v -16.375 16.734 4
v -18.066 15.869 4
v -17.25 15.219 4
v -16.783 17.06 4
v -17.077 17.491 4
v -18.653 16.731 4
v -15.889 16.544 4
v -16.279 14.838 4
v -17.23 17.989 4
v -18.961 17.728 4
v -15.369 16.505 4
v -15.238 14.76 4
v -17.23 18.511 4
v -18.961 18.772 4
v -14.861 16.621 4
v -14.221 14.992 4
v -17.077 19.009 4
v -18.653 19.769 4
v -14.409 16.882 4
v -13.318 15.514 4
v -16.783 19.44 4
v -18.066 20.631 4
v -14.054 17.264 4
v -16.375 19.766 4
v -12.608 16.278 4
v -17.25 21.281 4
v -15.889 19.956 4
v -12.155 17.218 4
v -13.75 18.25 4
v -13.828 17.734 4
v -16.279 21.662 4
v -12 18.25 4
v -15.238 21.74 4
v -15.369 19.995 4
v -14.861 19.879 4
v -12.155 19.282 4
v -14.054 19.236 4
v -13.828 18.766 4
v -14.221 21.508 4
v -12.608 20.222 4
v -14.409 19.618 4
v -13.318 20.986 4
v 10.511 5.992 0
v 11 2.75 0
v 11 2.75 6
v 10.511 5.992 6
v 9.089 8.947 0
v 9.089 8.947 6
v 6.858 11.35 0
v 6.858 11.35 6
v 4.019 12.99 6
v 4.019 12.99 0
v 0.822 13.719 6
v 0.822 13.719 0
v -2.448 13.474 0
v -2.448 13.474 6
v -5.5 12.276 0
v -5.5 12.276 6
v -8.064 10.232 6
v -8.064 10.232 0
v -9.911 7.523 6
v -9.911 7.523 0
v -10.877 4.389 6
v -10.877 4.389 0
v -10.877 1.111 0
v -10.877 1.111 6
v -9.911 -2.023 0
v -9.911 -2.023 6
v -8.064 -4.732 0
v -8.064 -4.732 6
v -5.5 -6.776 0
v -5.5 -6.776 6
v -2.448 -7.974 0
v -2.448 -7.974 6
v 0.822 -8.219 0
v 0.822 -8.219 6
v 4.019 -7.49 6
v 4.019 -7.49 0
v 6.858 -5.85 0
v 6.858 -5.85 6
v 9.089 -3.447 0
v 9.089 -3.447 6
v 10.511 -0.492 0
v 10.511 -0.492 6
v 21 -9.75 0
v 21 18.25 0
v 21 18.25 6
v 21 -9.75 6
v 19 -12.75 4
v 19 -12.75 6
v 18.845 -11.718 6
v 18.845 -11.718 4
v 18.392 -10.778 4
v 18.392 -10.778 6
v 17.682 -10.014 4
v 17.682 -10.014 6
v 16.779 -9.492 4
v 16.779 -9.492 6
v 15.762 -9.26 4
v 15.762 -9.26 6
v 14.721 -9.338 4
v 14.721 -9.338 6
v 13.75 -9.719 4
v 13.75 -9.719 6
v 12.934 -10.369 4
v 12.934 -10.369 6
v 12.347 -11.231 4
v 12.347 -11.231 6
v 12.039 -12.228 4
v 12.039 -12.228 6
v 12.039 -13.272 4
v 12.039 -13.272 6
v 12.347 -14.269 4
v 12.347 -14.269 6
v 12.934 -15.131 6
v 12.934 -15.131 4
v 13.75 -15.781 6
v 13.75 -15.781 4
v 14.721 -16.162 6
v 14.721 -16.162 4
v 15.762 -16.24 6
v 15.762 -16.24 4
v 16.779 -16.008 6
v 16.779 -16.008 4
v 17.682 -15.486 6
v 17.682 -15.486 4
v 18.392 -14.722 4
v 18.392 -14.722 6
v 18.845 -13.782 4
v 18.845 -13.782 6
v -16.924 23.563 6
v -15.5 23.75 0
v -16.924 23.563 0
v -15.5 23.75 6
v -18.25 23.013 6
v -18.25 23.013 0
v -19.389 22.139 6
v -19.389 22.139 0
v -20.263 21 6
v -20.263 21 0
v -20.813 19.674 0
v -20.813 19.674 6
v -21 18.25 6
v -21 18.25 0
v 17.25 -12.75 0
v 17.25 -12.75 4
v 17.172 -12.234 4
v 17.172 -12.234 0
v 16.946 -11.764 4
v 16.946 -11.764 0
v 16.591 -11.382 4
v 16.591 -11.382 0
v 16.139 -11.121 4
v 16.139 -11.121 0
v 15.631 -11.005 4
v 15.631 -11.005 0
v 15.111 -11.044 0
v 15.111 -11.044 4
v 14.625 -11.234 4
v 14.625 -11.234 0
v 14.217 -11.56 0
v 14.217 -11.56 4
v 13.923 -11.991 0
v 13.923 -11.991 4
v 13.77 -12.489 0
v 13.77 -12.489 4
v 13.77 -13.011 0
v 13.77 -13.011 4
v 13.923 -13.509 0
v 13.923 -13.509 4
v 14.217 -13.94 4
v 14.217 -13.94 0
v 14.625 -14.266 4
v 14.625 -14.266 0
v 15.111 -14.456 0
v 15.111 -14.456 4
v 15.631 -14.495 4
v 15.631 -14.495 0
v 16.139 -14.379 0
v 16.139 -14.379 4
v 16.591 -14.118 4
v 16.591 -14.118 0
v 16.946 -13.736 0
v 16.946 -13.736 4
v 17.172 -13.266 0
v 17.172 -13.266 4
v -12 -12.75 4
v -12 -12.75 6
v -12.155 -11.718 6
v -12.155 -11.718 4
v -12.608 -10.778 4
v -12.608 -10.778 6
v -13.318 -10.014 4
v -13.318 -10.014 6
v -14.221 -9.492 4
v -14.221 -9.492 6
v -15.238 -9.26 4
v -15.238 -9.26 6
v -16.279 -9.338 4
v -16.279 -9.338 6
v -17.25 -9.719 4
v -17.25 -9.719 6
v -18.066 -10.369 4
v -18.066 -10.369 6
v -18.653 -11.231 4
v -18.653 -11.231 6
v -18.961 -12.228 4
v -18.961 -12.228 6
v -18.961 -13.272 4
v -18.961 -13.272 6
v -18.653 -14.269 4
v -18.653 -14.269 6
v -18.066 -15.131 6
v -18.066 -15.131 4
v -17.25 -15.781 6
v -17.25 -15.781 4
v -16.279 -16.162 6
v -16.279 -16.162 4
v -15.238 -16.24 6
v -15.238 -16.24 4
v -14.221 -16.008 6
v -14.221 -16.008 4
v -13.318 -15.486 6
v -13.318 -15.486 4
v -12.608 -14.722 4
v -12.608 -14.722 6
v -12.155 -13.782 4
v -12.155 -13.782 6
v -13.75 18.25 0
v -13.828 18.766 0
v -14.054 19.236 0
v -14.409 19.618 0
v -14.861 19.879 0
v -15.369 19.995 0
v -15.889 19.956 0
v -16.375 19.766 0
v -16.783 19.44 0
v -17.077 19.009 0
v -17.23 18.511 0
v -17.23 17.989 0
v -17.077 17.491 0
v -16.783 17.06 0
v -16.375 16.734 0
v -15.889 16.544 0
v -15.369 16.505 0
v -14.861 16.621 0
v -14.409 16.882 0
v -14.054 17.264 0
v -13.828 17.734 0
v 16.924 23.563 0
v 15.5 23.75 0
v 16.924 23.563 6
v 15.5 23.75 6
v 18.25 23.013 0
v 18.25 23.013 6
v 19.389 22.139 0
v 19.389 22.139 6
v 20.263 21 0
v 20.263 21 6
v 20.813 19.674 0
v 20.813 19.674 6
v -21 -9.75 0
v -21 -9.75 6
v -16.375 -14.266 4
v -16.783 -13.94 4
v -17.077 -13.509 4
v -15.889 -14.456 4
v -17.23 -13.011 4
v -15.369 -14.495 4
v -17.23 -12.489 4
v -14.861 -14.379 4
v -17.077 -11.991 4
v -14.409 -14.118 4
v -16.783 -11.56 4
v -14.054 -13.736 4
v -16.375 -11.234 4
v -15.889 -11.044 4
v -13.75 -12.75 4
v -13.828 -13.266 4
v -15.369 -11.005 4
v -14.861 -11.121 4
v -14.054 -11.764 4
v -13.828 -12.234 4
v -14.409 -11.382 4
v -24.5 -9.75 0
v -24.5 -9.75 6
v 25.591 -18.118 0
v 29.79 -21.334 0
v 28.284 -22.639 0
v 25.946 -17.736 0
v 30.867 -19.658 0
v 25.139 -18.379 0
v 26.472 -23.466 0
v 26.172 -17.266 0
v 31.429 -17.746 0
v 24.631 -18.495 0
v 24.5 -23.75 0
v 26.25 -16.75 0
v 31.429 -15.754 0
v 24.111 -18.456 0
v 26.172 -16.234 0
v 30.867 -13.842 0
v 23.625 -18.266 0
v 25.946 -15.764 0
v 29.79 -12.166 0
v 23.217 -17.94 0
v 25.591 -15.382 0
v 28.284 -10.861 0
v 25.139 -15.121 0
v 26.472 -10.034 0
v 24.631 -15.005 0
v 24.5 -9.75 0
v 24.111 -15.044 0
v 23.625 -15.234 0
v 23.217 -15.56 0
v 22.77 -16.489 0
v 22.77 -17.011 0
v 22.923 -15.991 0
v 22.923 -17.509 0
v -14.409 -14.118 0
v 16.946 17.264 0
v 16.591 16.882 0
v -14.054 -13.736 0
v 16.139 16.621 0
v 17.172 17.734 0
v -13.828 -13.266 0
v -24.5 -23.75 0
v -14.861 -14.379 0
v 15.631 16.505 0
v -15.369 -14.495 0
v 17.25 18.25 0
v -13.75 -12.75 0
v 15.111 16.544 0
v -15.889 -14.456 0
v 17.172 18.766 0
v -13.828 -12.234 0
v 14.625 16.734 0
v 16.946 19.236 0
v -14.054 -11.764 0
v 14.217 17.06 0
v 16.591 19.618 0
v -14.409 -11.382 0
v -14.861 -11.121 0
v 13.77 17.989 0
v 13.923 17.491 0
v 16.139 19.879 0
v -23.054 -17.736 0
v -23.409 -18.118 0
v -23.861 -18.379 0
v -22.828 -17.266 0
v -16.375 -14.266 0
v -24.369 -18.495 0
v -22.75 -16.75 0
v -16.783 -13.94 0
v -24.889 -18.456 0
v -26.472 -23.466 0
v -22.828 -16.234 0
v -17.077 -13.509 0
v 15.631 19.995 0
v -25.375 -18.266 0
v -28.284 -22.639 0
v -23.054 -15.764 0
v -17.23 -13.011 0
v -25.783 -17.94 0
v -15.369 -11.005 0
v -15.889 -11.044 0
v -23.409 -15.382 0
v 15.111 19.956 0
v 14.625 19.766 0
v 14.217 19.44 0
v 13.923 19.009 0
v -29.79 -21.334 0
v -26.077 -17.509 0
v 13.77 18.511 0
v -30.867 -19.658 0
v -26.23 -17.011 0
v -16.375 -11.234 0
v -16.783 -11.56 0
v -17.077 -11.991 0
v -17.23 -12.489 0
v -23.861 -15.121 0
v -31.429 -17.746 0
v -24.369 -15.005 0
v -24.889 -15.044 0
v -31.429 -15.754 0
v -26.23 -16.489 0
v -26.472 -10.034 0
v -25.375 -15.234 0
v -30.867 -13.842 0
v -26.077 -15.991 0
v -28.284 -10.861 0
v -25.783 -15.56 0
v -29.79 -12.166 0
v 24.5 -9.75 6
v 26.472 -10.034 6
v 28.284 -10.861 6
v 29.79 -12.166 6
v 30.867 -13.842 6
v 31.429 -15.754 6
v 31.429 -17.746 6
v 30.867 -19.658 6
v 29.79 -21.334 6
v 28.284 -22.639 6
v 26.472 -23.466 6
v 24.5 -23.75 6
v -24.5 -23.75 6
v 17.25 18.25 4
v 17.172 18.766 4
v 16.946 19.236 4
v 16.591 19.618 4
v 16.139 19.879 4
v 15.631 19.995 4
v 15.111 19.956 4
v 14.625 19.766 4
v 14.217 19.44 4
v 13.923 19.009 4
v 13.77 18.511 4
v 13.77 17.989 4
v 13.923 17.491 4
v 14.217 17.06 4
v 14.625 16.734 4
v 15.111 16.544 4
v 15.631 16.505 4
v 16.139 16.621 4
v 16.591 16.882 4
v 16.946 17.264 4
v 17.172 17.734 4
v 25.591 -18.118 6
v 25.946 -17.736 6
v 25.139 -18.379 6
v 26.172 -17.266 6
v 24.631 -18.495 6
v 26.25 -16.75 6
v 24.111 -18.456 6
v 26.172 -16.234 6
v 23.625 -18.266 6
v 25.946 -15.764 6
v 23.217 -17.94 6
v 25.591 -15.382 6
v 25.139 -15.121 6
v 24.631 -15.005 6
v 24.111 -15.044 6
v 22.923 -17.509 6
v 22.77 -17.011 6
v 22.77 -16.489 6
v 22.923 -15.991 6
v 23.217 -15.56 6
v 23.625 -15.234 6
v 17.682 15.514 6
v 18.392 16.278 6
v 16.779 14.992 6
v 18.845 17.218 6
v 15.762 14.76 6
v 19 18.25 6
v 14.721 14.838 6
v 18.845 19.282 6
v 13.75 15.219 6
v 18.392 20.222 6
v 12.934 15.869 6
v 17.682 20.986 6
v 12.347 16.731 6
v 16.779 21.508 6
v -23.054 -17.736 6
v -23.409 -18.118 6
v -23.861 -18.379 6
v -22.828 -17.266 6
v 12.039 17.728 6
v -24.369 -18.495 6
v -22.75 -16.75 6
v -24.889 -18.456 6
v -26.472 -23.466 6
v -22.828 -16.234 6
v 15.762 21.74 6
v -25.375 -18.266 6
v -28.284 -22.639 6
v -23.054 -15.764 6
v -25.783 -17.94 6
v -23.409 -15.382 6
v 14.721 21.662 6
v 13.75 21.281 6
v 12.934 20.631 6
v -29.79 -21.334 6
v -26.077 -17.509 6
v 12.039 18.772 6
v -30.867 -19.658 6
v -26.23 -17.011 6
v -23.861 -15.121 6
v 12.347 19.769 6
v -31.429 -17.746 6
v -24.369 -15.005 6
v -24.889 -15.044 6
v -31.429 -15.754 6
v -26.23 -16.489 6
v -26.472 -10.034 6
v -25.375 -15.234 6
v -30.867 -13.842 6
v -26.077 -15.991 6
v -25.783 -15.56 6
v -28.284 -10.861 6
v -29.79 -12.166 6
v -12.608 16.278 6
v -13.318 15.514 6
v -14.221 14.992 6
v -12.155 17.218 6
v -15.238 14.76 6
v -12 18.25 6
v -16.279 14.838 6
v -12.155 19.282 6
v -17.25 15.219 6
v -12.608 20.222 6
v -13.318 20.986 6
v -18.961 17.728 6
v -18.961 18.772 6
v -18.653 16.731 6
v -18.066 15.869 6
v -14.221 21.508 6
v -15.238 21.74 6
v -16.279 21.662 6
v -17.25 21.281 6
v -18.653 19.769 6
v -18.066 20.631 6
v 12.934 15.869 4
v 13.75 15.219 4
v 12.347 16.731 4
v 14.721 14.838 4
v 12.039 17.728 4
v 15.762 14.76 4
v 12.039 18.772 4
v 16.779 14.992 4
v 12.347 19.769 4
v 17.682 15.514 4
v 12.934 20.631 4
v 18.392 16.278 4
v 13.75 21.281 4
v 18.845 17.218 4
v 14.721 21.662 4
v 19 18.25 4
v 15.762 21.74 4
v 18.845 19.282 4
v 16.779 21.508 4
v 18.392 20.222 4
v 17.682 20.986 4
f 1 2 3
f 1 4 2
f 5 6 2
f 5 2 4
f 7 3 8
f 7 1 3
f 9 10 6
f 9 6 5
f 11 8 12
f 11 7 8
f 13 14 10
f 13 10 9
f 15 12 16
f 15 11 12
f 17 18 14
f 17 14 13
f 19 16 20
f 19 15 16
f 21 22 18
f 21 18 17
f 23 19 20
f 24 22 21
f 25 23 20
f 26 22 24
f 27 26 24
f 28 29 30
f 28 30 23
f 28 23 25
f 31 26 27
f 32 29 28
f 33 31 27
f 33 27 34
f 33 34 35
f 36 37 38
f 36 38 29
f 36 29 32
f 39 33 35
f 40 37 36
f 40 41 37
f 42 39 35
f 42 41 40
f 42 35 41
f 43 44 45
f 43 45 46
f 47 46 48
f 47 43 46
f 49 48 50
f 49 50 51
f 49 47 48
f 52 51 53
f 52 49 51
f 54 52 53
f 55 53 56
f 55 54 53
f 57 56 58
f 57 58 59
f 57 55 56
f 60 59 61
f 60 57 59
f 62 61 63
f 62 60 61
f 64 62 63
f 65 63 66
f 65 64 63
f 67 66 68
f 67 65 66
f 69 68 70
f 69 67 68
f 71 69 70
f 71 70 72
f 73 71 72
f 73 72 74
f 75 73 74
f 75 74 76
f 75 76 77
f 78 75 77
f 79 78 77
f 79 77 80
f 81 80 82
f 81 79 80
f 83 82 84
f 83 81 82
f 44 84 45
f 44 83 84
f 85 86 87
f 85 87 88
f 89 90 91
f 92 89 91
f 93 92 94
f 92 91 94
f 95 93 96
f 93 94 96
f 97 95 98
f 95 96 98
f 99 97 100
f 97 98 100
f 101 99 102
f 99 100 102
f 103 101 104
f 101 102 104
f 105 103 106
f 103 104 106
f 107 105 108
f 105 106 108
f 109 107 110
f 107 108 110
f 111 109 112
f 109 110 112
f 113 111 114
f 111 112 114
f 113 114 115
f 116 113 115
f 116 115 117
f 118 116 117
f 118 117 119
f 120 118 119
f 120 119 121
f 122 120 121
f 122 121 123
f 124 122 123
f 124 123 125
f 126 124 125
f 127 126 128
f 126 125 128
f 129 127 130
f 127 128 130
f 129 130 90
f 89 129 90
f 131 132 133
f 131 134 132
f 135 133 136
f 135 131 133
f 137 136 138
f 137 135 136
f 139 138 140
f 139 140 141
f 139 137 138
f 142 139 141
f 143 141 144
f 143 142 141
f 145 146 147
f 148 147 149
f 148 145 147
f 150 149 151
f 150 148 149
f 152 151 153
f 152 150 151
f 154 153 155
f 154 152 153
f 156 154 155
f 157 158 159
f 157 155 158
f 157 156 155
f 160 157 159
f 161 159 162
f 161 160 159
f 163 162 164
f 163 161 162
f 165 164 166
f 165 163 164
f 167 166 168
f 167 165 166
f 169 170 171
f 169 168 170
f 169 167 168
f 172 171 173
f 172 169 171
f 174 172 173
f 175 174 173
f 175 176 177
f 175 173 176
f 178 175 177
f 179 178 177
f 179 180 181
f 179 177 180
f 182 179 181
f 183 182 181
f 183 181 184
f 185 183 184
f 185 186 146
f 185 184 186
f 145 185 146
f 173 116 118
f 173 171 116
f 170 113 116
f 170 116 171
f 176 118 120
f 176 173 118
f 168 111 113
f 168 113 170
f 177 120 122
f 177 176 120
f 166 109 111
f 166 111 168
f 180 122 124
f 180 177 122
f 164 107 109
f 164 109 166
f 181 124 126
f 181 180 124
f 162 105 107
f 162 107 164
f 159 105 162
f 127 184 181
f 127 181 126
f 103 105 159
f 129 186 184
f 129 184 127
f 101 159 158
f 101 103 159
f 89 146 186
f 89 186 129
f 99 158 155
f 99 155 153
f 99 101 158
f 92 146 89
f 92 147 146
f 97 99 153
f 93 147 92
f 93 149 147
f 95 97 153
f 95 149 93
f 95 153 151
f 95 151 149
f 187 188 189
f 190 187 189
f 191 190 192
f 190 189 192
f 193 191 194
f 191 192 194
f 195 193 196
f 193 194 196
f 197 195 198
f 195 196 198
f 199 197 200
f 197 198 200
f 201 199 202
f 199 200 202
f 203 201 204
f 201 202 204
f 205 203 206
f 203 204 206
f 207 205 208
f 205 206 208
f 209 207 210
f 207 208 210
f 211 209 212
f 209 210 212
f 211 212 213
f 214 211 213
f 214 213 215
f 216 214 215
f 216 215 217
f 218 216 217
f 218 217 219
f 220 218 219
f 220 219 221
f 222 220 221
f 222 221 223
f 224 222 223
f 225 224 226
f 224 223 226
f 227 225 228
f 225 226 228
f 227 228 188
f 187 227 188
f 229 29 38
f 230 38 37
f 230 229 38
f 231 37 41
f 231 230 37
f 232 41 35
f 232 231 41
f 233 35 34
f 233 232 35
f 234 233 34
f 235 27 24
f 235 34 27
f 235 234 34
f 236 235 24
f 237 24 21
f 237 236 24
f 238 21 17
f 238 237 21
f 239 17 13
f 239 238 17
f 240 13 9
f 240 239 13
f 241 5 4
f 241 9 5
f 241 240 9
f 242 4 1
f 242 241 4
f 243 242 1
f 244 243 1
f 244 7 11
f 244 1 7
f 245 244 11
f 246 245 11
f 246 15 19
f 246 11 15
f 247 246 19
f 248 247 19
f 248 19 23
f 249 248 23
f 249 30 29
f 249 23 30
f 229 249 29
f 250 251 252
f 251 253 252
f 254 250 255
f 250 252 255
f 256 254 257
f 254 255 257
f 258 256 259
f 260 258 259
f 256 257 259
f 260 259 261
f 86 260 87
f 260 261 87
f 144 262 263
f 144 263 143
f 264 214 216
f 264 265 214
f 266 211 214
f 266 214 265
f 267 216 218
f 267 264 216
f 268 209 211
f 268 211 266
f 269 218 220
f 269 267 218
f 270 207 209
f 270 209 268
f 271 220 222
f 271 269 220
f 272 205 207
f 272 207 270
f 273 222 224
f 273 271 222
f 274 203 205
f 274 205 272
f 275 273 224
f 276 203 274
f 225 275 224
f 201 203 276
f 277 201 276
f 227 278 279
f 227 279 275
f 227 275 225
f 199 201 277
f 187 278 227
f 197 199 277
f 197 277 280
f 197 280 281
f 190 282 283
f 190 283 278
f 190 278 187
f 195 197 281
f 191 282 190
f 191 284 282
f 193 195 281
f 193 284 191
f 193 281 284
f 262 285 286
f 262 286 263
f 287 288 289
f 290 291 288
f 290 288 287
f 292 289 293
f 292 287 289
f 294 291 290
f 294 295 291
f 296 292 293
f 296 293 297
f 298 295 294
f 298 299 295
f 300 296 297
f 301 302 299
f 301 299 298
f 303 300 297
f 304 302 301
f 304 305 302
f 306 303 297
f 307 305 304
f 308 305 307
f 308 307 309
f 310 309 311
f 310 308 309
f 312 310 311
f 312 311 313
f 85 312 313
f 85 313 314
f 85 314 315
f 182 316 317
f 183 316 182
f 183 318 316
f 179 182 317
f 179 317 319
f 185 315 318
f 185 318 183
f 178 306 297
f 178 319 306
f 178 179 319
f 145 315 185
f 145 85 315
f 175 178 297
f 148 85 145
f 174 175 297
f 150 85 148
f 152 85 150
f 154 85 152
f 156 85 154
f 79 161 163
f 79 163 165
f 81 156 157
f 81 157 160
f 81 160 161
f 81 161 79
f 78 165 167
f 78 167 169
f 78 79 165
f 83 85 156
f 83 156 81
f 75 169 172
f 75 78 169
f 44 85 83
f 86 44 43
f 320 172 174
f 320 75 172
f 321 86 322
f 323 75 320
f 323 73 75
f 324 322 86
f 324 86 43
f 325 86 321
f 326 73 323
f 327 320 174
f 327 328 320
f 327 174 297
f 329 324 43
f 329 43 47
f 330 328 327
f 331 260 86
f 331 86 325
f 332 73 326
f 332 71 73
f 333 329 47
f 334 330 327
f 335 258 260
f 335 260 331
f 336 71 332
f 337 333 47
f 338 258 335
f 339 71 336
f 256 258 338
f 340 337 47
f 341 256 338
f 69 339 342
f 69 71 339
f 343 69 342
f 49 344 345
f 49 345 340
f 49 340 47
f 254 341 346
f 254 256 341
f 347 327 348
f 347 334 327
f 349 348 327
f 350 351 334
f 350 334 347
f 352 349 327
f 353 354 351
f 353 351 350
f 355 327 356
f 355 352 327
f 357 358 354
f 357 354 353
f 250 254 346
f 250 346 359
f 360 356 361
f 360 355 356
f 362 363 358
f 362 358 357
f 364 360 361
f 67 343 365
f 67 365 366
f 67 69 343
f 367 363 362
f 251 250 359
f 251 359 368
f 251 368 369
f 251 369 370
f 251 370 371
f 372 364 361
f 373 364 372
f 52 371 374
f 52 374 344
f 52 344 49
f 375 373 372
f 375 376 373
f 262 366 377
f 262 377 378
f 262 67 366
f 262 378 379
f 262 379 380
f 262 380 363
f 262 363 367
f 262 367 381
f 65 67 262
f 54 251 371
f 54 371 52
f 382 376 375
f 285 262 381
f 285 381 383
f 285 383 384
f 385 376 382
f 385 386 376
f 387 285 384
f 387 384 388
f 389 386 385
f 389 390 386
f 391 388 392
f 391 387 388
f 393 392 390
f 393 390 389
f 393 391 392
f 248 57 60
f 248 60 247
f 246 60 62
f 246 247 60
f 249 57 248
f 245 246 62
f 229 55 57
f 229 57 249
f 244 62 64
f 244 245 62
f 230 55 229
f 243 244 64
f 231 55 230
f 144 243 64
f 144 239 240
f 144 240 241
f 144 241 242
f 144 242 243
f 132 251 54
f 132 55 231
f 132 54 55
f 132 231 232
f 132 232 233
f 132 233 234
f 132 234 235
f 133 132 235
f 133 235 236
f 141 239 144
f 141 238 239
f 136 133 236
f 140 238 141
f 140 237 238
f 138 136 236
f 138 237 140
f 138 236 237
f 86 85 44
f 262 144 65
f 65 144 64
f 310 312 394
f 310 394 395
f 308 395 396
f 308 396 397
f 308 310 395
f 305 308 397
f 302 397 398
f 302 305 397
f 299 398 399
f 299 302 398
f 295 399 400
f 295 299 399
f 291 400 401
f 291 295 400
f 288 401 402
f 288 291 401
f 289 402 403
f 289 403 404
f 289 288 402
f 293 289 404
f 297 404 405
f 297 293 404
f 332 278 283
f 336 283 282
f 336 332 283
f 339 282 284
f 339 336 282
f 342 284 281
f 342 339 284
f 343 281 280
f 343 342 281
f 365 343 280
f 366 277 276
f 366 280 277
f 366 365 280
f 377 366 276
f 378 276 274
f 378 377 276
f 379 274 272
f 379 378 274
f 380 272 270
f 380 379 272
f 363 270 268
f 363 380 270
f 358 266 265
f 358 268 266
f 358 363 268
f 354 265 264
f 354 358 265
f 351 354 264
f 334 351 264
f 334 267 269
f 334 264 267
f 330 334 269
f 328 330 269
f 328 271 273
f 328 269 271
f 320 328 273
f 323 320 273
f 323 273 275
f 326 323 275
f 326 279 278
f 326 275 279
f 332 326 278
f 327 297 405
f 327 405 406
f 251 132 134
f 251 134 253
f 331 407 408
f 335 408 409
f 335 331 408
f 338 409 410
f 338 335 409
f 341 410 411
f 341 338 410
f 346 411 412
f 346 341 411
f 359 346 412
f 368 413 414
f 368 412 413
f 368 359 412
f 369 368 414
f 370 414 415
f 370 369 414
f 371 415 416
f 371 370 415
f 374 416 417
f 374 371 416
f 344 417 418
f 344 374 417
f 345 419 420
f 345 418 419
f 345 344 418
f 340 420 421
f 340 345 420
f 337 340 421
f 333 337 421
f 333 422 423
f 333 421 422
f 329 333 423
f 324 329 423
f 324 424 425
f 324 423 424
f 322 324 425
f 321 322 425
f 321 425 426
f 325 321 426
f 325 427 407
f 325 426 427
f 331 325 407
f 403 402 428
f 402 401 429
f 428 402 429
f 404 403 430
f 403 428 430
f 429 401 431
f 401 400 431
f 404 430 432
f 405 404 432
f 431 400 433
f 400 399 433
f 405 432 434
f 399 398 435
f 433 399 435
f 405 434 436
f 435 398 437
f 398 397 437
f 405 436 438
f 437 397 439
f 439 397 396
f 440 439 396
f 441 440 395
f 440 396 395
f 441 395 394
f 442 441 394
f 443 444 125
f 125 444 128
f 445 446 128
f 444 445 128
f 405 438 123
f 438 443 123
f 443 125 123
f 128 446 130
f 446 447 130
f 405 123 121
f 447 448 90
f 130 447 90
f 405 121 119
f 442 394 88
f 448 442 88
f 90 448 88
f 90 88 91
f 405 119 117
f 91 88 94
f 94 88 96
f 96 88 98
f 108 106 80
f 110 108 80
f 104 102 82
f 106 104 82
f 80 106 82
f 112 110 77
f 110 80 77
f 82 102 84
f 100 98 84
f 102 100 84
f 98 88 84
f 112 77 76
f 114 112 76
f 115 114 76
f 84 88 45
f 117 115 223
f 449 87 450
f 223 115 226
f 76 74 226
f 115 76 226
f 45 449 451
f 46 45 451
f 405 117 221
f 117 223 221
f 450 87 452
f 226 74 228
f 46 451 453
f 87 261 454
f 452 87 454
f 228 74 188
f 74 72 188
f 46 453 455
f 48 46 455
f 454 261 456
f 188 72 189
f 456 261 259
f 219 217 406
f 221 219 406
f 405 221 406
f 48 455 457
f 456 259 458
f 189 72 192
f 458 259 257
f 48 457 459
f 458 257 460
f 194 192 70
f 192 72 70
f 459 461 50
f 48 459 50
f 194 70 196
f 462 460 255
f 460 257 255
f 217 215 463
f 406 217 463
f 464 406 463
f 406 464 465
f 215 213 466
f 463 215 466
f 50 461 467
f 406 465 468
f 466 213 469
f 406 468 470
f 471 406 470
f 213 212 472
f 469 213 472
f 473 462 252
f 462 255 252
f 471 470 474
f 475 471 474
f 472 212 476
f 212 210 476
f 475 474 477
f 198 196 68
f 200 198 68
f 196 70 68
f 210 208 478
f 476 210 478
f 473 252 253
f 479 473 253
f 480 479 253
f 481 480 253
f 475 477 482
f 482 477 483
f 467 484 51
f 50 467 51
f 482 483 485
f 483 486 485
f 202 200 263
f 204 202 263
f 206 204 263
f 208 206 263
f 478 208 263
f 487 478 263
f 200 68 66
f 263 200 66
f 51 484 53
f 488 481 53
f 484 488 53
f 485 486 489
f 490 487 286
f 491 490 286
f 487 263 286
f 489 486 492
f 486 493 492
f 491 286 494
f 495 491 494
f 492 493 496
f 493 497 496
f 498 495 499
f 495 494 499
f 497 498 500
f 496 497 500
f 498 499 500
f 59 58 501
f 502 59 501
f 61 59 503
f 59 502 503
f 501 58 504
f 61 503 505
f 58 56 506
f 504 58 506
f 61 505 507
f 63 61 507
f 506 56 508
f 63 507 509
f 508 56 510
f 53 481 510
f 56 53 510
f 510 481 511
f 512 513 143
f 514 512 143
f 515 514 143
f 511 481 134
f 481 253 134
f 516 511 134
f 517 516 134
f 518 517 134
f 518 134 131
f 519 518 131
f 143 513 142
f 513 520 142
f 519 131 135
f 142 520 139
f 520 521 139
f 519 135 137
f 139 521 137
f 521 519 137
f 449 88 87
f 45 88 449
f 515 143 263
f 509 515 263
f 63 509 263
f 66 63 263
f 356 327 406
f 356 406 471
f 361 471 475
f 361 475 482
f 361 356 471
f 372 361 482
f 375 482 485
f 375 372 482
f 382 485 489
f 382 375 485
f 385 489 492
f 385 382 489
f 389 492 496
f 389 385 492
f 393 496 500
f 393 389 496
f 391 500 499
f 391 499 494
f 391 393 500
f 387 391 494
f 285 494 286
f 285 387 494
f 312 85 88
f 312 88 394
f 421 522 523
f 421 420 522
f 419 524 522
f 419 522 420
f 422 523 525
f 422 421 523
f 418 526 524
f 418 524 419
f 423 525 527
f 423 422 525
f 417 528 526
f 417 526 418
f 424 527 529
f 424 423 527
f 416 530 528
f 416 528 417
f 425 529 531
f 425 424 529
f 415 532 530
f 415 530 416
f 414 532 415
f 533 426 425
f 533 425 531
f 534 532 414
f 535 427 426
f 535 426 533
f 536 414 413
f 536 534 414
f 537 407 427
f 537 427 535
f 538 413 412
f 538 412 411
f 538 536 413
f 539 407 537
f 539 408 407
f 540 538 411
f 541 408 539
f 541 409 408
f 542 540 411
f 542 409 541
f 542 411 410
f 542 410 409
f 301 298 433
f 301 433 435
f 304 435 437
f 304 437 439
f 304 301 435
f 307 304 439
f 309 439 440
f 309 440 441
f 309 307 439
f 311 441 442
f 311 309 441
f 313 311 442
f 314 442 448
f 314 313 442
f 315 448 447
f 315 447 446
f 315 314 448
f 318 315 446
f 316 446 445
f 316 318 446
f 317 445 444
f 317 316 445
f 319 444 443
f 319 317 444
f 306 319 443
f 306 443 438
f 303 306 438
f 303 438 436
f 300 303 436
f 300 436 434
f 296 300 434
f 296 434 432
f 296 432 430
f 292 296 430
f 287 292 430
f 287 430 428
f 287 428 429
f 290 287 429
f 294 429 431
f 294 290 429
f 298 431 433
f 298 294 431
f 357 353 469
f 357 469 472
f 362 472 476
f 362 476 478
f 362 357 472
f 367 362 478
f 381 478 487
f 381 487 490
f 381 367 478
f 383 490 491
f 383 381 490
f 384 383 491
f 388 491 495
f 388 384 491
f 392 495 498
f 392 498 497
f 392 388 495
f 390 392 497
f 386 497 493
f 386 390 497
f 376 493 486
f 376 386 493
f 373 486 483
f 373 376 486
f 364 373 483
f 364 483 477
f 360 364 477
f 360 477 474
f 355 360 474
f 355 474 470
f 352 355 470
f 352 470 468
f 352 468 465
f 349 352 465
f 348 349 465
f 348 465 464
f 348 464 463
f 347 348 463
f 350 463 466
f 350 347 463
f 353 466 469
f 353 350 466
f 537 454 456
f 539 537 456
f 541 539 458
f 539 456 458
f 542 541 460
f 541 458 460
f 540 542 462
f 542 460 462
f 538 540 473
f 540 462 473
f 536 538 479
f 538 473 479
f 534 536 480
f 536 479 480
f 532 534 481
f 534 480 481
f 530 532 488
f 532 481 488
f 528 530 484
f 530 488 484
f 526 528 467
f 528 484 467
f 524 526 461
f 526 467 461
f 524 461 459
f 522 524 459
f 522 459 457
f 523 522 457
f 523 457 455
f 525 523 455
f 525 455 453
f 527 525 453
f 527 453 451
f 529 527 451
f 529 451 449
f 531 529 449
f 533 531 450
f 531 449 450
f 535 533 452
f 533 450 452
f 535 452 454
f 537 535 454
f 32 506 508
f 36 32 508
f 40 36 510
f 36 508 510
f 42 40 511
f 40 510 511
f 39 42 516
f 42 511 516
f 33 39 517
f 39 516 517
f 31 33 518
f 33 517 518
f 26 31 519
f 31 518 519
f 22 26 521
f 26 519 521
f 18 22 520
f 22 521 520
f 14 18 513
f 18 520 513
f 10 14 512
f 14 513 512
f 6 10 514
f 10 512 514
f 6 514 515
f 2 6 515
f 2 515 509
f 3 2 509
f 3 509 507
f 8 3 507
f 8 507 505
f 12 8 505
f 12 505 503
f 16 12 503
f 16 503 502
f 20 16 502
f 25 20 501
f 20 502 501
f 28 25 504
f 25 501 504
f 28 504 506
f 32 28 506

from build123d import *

# Parameters (mm, degrees)
ESBO_O1_R                = 1.75
ESBO_O1_R_2              = 11
RESSALTO_EXTRUS_O1_DEPTH = 6
FILETE1_R                = 5.5
ESBO_O2_R                = 3.5
CORTE_EXTRUS_O1_DEPTH    = 2


with BuildPart() as part:
    # Esboço1 → Ressalto-extrusão1 (new body)
    with BuildSketch(Plane.XY):
        with BuildLine():
            Line((-21, 23.75), (21, 23.75))
            Line((21, 23.75), (21, -9.75))
            Line((21, -9.75), (24.5, -9.75))
            ThreePointArc((24.5, -9.75), (31.5, -16.75), (24.5, -23.75))
            Line((24.5, -23.75), (21, -23.75))
            Line((21, -23.75), (-21, -23.75))
            Line((-21, -23.75), (-24.5, -23.75))
            ThreePointArc((-24.5, -23.75), (-31.5, -16.75), (-24.5, -9.75))
            Line((-24.5, -9.75), (-21, -9.75))
            Line((-21, -9.75), (-21, 23.75))
        make_face()
        with Locations((24.5, -16.75)):
            Circle(ESBO_O1_R, mode=Mode.SUBTRACT)
        with Locations((0, 2.75)):
            Circle(ESBO_O1_R_2, mode=Mode.SUBTRACT)
        with Locations((15.5, 18.25)):
            Circle(ESBO_O1_R, mode=Mode.SUBTRACT)
        with Locations((15.5, -12.75)):
            Circle(ESBO_O1_R, mode=Mode.SUBTRACT)
        with Locations((-15.5, 18.25)):
            Circle(ESBO_O1_R, mode=Mode.SUBTRACT)
        with Locations((-15.5, -12.75)):
            Circle(ESBO_O1_R, mode=Mode.SUBTRACT)
        with Locations((-24.5, -16.75)):
            Circle(ESBO_O1_R, mode=Mode.SUBTRACT)
    extrude(amount=RESSALTO_EXTRUS_O1_DEPTH)

    # Filete1
    filete1_edges = [part.edges().sort_by_distance(p)[0] for p in [
        (-21, 23.75, 3),
        (21, 23.75, 3),
    ]]
    fillet(filete1_edges, radius=FILETE1_R)

    # Esboço2 → Corte-extrusão1 (cut)
    with BuildSketch(Plane.XY.offset(6)):
        with Locations((-15.5, 18.25)):
            Circle(ESBO_O2_R)
        with Locations((15.5, 18.25)):
            Circle(ESBO_O2_R)
        with Locations((15.5, -12.75)):
            Circle(ESBO_O2_R)
        with Locations((-15.5, -12.75)):
            Circle(ESBO_O2_R)
    extrude(amount=-CORTE_EXTRUS_O1_DEPTH, mode=Mode.SUBTRACT)


solid = part.part
